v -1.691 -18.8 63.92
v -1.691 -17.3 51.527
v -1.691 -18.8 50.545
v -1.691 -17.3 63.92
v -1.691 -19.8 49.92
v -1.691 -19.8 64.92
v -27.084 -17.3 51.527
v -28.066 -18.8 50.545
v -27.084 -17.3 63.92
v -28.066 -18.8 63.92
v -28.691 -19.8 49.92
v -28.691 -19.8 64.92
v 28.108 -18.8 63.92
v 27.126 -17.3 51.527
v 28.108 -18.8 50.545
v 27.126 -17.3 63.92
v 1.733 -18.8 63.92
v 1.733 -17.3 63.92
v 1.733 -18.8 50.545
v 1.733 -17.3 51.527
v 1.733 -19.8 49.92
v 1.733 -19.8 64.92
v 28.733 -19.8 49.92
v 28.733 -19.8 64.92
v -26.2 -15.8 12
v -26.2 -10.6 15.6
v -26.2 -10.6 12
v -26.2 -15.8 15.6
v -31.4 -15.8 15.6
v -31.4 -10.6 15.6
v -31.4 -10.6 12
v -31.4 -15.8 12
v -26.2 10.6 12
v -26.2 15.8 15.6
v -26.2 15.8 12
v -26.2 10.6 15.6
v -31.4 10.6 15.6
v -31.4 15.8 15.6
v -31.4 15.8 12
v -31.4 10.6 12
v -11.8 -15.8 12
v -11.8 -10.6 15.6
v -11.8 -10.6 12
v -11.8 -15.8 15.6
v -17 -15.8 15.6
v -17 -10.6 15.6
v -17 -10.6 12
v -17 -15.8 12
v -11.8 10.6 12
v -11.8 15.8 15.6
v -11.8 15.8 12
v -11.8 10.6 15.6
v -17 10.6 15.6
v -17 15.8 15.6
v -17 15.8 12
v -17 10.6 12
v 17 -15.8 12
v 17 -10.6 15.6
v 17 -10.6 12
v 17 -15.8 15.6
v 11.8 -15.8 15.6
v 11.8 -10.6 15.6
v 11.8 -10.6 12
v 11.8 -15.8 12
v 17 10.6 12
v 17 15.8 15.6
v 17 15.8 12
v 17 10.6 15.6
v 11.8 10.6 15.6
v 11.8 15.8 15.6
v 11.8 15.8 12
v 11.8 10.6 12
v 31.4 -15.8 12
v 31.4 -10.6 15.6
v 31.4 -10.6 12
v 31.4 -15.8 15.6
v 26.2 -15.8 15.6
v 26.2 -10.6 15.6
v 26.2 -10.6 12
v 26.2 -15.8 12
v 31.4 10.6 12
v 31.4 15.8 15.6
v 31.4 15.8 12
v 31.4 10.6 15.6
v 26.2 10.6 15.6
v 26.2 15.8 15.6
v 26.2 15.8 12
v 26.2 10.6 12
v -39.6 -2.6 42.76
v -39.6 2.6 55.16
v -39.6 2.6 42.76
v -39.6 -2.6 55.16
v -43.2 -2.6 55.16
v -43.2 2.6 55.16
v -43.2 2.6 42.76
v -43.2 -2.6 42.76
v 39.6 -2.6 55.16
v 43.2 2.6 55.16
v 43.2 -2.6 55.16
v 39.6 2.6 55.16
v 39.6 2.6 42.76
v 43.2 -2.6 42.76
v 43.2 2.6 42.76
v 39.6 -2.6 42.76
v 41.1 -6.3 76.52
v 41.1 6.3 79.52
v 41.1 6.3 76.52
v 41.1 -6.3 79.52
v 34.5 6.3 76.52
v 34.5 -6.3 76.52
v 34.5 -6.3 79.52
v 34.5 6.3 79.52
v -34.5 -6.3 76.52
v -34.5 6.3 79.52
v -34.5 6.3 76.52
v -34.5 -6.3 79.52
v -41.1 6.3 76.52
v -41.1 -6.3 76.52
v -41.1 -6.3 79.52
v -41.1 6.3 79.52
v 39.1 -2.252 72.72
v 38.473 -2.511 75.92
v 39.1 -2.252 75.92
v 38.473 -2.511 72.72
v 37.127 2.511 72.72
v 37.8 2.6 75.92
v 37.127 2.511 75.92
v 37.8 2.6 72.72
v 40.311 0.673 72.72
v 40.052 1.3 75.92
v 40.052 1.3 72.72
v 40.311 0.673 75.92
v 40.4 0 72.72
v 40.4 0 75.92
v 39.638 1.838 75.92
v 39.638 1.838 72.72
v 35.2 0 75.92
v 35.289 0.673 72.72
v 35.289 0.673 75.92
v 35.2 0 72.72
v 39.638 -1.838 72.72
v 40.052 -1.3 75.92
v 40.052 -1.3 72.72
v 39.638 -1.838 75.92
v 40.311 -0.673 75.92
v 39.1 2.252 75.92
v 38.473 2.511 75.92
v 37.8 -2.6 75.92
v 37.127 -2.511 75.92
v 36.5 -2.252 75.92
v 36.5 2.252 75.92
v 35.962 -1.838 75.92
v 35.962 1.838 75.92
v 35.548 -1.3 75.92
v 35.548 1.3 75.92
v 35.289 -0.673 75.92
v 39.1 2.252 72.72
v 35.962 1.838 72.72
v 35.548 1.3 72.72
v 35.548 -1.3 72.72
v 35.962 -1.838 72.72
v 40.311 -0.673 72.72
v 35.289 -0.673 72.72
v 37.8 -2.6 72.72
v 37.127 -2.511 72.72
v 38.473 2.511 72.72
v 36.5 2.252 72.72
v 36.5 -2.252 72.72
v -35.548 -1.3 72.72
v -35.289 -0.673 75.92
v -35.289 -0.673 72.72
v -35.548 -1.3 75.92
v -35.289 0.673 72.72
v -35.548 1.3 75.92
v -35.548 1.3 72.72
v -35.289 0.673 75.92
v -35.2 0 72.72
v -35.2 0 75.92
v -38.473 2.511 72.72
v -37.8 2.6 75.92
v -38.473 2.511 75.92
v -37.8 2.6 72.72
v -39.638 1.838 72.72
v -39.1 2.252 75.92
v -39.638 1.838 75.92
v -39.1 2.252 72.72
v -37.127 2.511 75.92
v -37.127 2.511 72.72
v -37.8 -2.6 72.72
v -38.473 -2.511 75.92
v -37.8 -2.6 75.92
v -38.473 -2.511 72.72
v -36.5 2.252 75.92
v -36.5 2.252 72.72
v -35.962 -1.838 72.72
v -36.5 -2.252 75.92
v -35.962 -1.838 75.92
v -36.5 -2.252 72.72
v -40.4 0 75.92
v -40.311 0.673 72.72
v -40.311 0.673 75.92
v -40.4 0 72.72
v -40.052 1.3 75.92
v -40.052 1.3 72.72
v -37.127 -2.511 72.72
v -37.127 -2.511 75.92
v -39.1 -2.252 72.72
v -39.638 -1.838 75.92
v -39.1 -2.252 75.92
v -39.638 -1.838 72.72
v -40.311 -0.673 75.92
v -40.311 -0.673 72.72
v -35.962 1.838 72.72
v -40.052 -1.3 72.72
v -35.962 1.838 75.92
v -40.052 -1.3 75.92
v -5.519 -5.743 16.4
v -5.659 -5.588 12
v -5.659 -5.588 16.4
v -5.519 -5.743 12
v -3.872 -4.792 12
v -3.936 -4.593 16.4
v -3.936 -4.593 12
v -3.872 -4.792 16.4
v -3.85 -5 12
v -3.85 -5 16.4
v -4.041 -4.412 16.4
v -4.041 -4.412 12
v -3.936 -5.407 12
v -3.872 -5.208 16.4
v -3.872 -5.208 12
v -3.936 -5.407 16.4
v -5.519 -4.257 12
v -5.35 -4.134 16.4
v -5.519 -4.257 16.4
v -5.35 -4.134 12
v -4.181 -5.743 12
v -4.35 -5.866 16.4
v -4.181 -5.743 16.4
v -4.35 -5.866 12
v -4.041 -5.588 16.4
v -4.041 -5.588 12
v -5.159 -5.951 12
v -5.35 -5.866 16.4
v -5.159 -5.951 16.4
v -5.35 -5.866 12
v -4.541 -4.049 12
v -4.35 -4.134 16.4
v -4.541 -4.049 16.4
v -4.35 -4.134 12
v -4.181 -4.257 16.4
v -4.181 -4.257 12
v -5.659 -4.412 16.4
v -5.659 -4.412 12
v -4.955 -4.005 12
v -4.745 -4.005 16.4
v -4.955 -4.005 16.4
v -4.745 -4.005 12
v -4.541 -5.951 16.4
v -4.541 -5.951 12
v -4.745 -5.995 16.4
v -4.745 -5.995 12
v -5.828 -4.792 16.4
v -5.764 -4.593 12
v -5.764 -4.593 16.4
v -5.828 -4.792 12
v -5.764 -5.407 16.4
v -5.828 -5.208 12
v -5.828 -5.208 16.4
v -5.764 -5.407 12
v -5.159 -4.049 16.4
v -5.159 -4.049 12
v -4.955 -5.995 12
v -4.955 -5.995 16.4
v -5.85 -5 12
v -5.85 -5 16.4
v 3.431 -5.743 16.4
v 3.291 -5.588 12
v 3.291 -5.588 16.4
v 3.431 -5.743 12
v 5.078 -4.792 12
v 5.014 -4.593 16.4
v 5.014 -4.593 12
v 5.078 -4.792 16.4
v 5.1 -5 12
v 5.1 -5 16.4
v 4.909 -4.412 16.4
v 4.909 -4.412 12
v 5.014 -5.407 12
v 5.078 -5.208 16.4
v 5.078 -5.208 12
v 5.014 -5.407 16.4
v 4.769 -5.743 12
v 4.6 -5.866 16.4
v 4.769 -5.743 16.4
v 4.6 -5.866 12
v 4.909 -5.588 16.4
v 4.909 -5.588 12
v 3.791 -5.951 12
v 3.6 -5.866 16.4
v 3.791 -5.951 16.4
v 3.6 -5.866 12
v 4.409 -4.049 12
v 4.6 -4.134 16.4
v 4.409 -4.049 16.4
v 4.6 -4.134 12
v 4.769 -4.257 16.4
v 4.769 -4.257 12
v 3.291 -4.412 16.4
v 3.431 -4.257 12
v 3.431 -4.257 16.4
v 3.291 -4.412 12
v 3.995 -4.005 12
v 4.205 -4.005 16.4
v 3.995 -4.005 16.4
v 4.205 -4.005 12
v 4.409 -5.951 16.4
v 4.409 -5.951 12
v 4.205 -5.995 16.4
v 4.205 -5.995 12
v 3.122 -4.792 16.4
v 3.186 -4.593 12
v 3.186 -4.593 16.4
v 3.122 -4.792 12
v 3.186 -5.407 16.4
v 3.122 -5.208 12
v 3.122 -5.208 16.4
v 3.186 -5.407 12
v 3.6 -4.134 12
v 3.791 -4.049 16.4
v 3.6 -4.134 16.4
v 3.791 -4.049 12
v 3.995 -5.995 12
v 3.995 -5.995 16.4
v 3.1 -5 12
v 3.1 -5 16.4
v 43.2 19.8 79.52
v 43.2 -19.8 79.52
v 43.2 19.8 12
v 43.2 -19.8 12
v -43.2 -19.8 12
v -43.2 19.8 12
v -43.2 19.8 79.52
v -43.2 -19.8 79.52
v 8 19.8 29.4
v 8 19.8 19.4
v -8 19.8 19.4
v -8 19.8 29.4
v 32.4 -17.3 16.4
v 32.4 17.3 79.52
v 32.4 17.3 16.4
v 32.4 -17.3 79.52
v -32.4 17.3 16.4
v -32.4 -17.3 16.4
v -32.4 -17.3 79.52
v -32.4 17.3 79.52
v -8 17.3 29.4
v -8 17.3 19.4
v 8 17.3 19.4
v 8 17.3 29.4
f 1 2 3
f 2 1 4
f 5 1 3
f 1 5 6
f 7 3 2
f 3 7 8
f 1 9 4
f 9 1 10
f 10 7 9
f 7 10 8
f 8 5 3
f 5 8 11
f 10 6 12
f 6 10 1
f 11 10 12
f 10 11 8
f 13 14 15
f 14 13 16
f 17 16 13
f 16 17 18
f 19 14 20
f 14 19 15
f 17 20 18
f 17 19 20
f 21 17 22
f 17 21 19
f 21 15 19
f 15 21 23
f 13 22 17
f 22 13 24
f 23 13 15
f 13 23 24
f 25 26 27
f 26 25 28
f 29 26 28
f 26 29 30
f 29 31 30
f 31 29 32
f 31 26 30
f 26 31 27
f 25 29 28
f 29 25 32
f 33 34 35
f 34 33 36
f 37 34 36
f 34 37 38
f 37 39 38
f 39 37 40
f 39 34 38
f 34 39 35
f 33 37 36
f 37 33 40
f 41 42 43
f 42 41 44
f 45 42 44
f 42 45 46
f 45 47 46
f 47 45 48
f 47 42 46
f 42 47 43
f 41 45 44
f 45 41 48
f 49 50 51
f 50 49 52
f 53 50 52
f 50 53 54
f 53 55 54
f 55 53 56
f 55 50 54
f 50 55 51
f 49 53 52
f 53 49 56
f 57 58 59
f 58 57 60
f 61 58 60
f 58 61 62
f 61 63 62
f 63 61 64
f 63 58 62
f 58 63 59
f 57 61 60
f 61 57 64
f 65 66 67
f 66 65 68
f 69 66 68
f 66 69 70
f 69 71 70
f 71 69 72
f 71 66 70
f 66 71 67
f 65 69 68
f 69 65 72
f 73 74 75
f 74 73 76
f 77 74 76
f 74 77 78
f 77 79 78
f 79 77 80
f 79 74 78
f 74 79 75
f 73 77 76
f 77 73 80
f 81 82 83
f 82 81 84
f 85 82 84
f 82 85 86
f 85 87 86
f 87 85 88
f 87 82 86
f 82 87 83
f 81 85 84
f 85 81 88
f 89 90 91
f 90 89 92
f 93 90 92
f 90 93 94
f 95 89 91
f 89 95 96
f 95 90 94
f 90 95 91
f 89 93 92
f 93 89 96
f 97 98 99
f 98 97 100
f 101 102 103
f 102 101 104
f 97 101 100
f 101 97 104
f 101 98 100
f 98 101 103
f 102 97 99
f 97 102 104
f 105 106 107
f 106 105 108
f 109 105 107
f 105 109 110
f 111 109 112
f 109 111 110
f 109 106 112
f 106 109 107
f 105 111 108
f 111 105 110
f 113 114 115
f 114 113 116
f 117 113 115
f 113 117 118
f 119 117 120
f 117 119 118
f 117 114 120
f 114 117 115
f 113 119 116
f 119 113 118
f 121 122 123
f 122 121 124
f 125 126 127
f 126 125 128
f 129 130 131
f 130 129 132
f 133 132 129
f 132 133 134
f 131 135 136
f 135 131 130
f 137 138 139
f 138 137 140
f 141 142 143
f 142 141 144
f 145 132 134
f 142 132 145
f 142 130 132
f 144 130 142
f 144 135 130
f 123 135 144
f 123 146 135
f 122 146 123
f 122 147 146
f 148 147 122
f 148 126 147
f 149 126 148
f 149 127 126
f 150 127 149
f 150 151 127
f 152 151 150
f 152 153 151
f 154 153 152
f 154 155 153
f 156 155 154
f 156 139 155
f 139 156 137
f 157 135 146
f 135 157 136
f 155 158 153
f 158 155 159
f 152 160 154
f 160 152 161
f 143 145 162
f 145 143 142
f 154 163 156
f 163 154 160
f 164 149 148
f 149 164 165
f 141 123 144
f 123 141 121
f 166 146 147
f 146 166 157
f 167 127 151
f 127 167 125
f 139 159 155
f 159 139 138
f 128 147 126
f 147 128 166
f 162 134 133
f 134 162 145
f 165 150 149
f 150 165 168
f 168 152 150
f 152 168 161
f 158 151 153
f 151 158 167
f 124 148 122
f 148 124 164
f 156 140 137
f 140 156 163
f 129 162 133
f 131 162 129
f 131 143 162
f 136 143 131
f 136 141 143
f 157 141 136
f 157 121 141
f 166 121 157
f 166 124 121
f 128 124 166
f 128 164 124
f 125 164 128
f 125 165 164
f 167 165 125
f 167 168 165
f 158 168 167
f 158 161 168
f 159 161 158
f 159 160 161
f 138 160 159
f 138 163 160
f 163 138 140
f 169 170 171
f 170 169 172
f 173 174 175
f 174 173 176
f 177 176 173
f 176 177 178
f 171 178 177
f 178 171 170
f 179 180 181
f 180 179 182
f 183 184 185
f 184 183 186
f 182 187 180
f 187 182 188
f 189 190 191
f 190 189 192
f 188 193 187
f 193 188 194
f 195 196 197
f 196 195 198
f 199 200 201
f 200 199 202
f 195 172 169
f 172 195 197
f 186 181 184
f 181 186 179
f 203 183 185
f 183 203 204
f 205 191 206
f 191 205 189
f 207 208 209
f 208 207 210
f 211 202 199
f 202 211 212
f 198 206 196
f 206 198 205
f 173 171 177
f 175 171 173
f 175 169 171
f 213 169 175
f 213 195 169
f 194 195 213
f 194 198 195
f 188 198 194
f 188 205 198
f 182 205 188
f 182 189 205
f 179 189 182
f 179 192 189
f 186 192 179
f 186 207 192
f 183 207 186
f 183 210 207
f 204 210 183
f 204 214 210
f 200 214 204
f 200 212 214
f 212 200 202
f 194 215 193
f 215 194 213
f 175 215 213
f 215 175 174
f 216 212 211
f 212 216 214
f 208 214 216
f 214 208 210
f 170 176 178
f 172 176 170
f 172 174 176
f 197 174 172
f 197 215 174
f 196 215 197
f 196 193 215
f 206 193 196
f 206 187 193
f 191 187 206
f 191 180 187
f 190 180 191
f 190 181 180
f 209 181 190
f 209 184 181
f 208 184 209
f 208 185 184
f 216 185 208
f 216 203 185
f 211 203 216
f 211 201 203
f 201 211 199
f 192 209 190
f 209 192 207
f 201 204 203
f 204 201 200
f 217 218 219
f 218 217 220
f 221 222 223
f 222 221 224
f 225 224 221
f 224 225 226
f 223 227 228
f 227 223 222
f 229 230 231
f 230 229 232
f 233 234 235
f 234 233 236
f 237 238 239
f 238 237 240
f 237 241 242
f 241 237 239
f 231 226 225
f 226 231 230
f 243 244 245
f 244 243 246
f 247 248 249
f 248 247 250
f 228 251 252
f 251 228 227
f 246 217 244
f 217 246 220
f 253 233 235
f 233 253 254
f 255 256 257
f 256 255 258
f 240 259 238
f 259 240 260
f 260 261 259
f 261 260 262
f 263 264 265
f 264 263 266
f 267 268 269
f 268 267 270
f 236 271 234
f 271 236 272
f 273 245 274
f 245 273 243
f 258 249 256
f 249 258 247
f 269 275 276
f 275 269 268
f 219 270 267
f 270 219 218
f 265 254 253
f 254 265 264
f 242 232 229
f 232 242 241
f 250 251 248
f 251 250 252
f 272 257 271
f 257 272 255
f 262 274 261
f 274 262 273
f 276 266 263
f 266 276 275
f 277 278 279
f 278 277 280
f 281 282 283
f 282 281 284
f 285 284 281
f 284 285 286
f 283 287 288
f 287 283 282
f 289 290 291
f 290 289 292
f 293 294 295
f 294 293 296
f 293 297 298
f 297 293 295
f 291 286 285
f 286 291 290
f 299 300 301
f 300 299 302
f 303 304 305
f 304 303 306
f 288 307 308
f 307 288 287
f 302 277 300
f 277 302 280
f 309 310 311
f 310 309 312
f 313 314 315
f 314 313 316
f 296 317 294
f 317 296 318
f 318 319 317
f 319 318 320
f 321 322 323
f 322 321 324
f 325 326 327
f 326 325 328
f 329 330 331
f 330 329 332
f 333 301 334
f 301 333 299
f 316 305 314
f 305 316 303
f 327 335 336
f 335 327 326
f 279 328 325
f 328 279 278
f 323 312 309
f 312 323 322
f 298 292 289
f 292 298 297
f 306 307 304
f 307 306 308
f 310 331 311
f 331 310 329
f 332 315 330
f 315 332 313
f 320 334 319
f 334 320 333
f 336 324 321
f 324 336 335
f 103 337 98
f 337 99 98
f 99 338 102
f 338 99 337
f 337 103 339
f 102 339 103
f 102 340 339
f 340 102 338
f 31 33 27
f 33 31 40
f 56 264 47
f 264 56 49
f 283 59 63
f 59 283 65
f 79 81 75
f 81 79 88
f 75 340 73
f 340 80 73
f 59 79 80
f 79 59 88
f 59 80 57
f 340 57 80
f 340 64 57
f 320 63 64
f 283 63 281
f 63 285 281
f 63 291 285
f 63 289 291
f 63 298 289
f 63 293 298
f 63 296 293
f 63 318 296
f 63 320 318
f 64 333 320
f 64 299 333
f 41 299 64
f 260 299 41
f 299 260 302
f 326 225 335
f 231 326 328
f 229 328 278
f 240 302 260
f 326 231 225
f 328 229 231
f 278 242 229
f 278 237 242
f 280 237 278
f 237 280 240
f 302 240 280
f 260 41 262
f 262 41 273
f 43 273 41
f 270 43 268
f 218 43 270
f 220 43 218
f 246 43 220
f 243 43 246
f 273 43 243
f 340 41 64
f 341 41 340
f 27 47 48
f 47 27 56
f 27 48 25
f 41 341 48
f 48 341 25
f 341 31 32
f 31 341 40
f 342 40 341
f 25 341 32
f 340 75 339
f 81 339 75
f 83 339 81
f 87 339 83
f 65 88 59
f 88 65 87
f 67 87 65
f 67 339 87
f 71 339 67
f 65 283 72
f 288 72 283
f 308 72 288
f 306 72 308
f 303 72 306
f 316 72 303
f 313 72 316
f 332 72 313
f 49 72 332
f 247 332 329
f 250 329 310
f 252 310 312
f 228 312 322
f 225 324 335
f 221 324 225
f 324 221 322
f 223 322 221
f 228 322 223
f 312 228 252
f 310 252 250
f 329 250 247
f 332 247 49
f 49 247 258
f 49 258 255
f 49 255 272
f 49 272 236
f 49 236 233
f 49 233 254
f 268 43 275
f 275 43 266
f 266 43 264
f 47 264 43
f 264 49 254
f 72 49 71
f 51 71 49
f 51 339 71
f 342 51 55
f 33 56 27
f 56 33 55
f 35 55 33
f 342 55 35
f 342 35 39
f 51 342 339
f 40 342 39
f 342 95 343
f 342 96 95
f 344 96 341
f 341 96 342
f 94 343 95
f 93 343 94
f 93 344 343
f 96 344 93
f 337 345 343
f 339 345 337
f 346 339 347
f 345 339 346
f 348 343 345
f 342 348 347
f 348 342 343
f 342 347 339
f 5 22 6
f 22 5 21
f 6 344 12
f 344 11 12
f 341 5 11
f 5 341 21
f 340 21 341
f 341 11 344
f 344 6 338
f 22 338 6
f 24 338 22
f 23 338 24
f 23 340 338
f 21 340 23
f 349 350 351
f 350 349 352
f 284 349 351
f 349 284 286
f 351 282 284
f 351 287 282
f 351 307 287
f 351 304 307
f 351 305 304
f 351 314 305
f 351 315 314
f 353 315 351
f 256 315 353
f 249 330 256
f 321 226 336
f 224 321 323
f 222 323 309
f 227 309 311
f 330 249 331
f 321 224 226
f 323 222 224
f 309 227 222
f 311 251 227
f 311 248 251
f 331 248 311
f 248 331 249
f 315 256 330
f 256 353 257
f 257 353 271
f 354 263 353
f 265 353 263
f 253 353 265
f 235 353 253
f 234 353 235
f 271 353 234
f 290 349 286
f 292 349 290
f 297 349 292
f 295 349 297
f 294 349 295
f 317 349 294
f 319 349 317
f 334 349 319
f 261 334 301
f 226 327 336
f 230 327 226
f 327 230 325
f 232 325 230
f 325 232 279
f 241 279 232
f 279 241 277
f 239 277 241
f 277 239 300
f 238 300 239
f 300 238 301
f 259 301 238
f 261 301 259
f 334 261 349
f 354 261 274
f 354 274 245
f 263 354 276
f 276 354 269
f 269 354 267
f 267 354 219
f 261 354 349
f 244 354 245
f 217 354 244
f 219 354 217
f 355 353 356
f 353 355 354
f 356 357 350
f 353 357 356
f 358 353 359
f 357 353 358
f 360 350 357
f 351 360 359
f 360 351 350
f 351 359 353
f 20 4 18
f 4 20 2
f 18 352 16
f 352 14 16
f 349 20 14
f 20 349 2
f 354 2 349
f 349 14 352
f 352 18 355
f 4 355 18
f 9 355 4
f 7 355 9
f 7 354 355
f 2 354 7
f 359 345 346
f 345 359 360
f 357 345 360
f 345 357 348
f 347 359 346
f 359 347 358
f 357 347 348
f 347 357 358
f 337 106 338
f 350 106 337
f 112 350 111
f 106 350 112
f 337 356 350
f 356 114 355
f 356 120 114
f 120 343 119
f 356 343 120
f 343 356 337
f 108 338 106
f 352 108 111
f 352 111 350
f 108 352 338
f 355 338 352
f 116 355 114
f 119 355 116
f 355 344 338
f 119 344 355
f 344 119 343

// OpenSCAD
// =========================================================================
// CLAW-D MASCOT: LARGE EDITION (SLED READY, REAR SCREW MOUNTS)
// =========================================================================

/* [Fixed Hardware Specifications] */
pcb_w     = 27.3;             // Physical width of standard 0.96" OLED PCB
glass_t   = 2.4;              // Depth from front of OLED glass to back of PCB
clearance = 0.4;              // Global 3D printing tolerance fit
$fn       = 24;               // Curve smoothness (resolution for cylinders/arcs)

/* [Adjustable Features] */
print_mode           = "base"; // [ "assembled", "base", "cap", "legs", "arms" ]
eye_w                = 25;     // Width of the front eye cutouts (original: 23)
eye_h                = 12;     // Height of the front eye cutouts (original: 14)
eye_mm_height_adjust = 5;      // Vertical shift for the eye cutouts
eye_chamfer          = 2.0;    // Outward slant on outer edges for better viewing angle
top_softness         = 1.0;    // Top edge chamfer amount (leaves the rest flat for supports)
leg_inset            = 3.0;    // Inward adjustment distance for front and back legs

usb_hole_height_adjuster = 5.0; // Vertical shift for the rear USB-C cable pass-through

// Variables to protect the internal cavity while adding alignment pin holes
bottom_thickness_added = 2.4;  // Extra thickness added to the base for structural integrity
pin_height             = 3.0;  // Height of the alignment pins (arms/legs)
hole_depth             = 3.6;  // Depth of the receiving holes (allows 0.6mm clearance for glue/fit)

/* [Base Pocket Adjustments] */
pocket_w_extra = clearance + 0.2; // Extra width for base pocket (default was global clearance: 0.4)
pocket_d_extra = clearance + 0.2; // Extra depth for base pocket (default was global clearance: 0.4)
pocket_h_extra = clearance + 0.0; // Extra height/depth for base pocket (default was hardcoded 0.1)

/* [Magnetic Clasp & Split] */
magnet_dia      = 5.2; // Diameter of hidden pocket (+0.2mm tolerance for 5mm magnet)
magnet_depth    = 3.2; // Depth of hidden pocket (+0.2mm tolerance for 3mm magnet)
cover_thickness = 0.6; // Layers of plastic hiding the magnet (0.6 = 3x 0.2mm print layers)

/* [Sled Button Alignment] */
button_hole_d              = 2.0;  // Hole size for boot/reset access (sized for a paperclip)
esp_w                      = 18.2; // Matches internal sled's ESP width for exact offset mapping
left_button_hole_x_offset  = 4.25; // X-axis offset for the left (BOOT) button
right_button_hole_x_offset = 5.0;  // X-axis offset for the right (RESET) button
button_hole_y              = -5;   // Y-axis depth alignment (Maps to sled's updated math: 17.5 - 22.25)

// =========================================================================
// MAIN EXECUTION
// =========================================================================

if (print_mode == "cap") {
    // Flips the cap 180 degrees and drops the flat seam exactly to the Z=0 build plate
    // Math: Z-height shift = (2 * unit + head_h - 4)
    translate([0, 0, 2*7.2 + 69.12 - 4]) 
        rotate([180, 0, 0]) 
            clawd_chassis();
} else {
    clawd_chassis();
}

// =========================================================================
// CHASSIS MODULE
// =========================================================================

module clawd_chassis() {
    
    // 1. HARDCODED LARGE PARAMETERS
    unit   = 7.2;
    head_w = 86.4;    // 12 * 7.2 (Total head width)
    head_h = 69.12;   // 86.4 / 1.25 (Total head height proportional to width)
    head_d = 39.6;    // 5.5 * 7.2 (Total head depth)
    
    // Split line and Boss parameters for two-part printing
    split_z = 2*unit + head_h - 4; // Z-height where the cap splits from the base
    boss_w  = 6.0;                 // Width of the alignment bosses
    boss_d  = 12.0;                // Depth of the alignment bosses
    boss_h  = 3.0;                 // Height of the alignment bosses
    boss_x  = 37.8;                // X-axis position (centered precisely in the solid side-walls)

    // Render the main body if we are printing the base, cap, or full assembly
    if (print_mode == "base" || print_mode == "cap" || print_mode == "assembled") {
        difference() {
            // 2. THE ACCURATE PROPORTIONAL OUTER SHELL
            union() {
                // Main Head (Bottom extended downward by bottom_thickness_added)
                translate([-head_w/2, -head_d/2, 2*unit - bottom_thickness_added]) 
                    cube([head_w, head_d, head_h + bottom_thickness_added]);
                    
                // Structural Alignment Bosses (Added to Cap for reassembly)
                if (print_mode == "cap" || print_mode == "assembled") {
                    translate([boss_x - boss_w/2, -boss_d/2, split_z - boss_h])
                        cube([boss_w, boss_d, boss_h]);
                    translate([-boss_x - boss_w/2, -boss_d/2, split_z - boss_h])
                        cube([boss_w, boss_d, boss_h]);
                }
                
                // Attach non-removable limbs for 'assembled' visualization
                if (print_mode == "assembled") {
                    // Left Side Stub/Arm
                    translate([-head_w/2 - 2*unit, -unit/2, head_h/2 + unit]) 
                        cube([2*unit, unit, 2*unit]);
                    
                    // Right Side Stub/Arm
                    translate([head_w/2, -unit/2, head_h/2 + unit]) 
                        cube([2*unit, unit, 2*unit]);
                        
                    // ---- STABLE EIGHT LEG SQUID STRUCTURE ----
                    for(x = [-4.5*unit, -2.5*unit, 1.5*unit, 3.5*unit]) {
                        for(y = [-head_d/2 + leg_inset, head_d/2 - unit - leg_inset]) {
                            // Legs end where the newly lowered chassis begins
                            translate([x, y, 0]) 
                                cube([unit, unit, 2*unit - bottom_thickness_added]);
                        }
                    }
                }
            }
            
            // 3. INTERNAL CAVITY (Untouched coordinates)
            // Hollows out the center for the PCB sled and wiring
            translate([-4.5*unit, -head_d/2 + 2.5, 2*unit + 2])
                cube([9*unit, head_d - 5, head_h - 3.8]);
                
            // 4. FRONT FACE EYE WINDOWS (Two-Stage Cut for Supports + Soft Edge)
            eye_shift_x = 0.4; // Fine-tuning offset to perfectly center the eyes
            
            // Left Eye Cutout
            translate([-2.5*unit - eye_w/2.75 + eye_shift_x, -head_d/2 - 0.1, head_h - 2.25*unit - eye_h/2 + eye_mm_height_adjust])
                chamfered_eye(is_left = true);
                
            // Right Eye Cutout
            translate([2.5*unit - eye_w/1.5 + eye_shift_x, -head_d/2 - 0.1, head_h - 2.25*unit - eye_h/2 + eye_mm_height_adjust])
                chamfered_eye(is_left = false);
                
            // 5. PRECISION SCREEN RETENTION SLOT (Untouched coordinates)
            // Secures the OLED glass directly against the front wall
            translate([-4.5*unit, -head_d/2 + 2.5, 2*unit + 2])
                cube([9*unit, glass_t + clearance, head_h - 3.8]);

            // 6. UPPER WIRING & PIN RELIEF CHANNEL (Untouched coordinates)
            // Provides headroom for dupont wires or headers at the top of the sled
            translate([-4.5*unit, -head_d/2 + 2.5, head_h + unit - 2])
                cube([9*unit, head_d - 5, 3]);
                
            // 7. DIRECT REAR USB-C CABLE PASS-THROUGH (Untouched coordinates)
            translate([-8, head_d/2 - 4, 2*unit + usb_hole_height_adjuster])
                cube([16, 10, 10]);

            // 8. LEG ALIGNMENT HOLES
            if (print_mode == "base") {
                for(x = [-4.5*unit, -2.5*unit, 1.5*unit, 3.5*unit]) {
                    for(y = [-head_d/2 + leg_inset, head_d/2 - unit - leg_inset]) {
                        // Cut upwards from the newly lowered chassis bottom to receive leg pins
                        translate([x + 1.2 - clearance/2, y + 1.2 - clearance/2, 2*unit - bottom_thickness_added - 0.1])
                            cube([unit - 2.4 + clearance, unit - 2.4 + clearance, hole_depth + 0.1]);
                    }
                }
            }
            
            // 8.5 ARM ALIGNMENT HOLES
            if (print_mode == "base") {
                // Left Arm Hole
                translate([-head_w/2 - 0.1, -unit/2 + 1.2 - clearance/2, head_h/2 + unit + 1.2 - clearance/2])
                    cube([hole_depth + 0.1, unit - 2.4 + clearance, 2*unit - 2.4 + clearance]);
                    
                // Right Arm Hole
                translate([head_w/2 - hole_depth, -unit/2 + 1.2 - clearance/2, head_h/2 + unit + 1.2 - clearance/2])
                    cube([hole_depth + 0.1, unit - 2.4 + clearance, 2*unit - 2.4 + clearance]);
            }
                
            // 9. FLAT SEAM SPLIT (Creates the physical separation between Cap and Base)
            if (print_mode == "base") {
                // Flush cut everything above the split line
                translate([-head_w/2 - 5, -head_d/2 - 5, split_z]) 
                    cube([head_w + 10, head_d + 10, 20]);
            }
            
            if (print_mode == "cap") {
                // Flush cut everything below the split line, EXCEPT the bosses
                difference() {
                    translate([-100, -100, -20]) 
                        cube([200, 200, split_z + 20]);
                        
                    // Protect bosses from being severed by the flush cut
                    translate([boss_x - boss_w/2 - 0.1, -boss_d/2 - 0.1, split_z - boss_h - 0.1])
                        cube([boss_w + 0.2, boss_d + 0.2, boss_h + 0.2]);
                    translate([-boss_x - boss_w/2 - 0.1, -boss_d/2 - 0.1, split_z - boss_h - 0.1])
                        cube([boss_w + 0.2, boss_d + 0.2, boss_h + 0.2]);
                }
            }

            // 9.5 ALIGNMENT POCKETS & HIDDEN MAGNET VOIDS
            if (print_mode == "base") {
                // Clearance pockets for the Cap bosses to slot into
                translate([boss_x - boss_w/2 - pocket_w_extra/2, -boss_d/2 - pocket_d_extra/2, split_z - boss_h])
                    cube([boss_w + pocket_w_extra, boss_d + pocket_d_extra, boss_h + pocket_h_extra]);
                translate([-boss_x - boss_w/2 - pocket_w_extra/2, -boss_d/2 - pocket_d_extra/2, split_z - boss_h])
                    cube([boss_w + pocket_w_extra, boss_d + pocket_d_extra, boss_h + pocket_h_extra]);
                    
                // Hidden magnet voids below the clearance pockets
                // (Intended for a mid-print pause to drop magnets in before covering the top)
                translate([boss_x, 0, split_z - boss_h - cover_thickness - magnet_depth])
                    cylinder(h=magnet_depth, d=magnet_dia);
                translate([-boss_x, 0, split_z - boss_h - cover_thickness - magnet_depth])
                    cylinder(h=magnet_depth, d=magnet_dia);
            }
            
            // 10. SLED BUTTON HOLES (BOOT / RESET access from underneath)
            if (print_mode == "base" || print_mode == "assembled") {
                // Left Hole (Boot)
                translate([-esp_w/2 + left_button_hole_x_offset, button_hole_y, 0])
                    cylinder(d=button_hole_d, h=20, $fn=30);
                
                // Right Hole (Reset)
                translate([esp_w/2 - right_button_hole_x_offset, button_hole_y, 0])
                    cylinder(d=button_hole_d, h=20, $fn=30);
            }
            
            if (print_mode == "cap") {
                // Hidden magnet voids inside the protruding bosses
                // (When cap is printed upside down, printer pauses here before bridging the floor)
                translate([boss_x, 0, split_z - boss_h + cover_thickness])
                    cylinder(h=magnet_depth, d=magnet_dia);
                translate([-boss_x, 0, split_z - boss_h + cover_thickness])
                    cylinder(h=magnet_depth, d=magnet_dia);
            }
        }
    }

    // 10. INDEPENDENT LEGS MODE
    if (print_mode == "legs") {
        for(x = [-4.5*unit, -2.5*unit, 1.5*unit, 3.5*unit]) {
            for(y = [-head_d/2 + leg_inset, head_d/2 - unit - leg_inset]) {
                union() {
                    // Leg base (exactly meets the lowered bottom of the chassis)
                    translate([x, y, 0]) 
                        cube([unit, unit, 2*unit - bottom_thickness_added]);
                    // Alignment pin (inserts into chassis hole)
                    translate([x + 1.2, y + 1.2, 2*unit - bottom_thickness_added]) 
                        cube([unit - 2.4, unit - 2.4, pin_height]);
                }
            }
        }
    }
    
    // 11. INDEPENDENT ARMS MODE (Laid flat for vertical pin printing)
    if (print_mode == "arms") {
        // Generates two identical arms side-by-side on the Z=0 build plane
        for(x = [-1.5*unit, 1.5*unit]) {
            translate([x - unit, -unit/2, 0]) {
                union() {
                    // Arm body (laying on its flat side for strength)
                    cube([2*unit, unit, 2*unit]);
                    // Alignment pin (pointing straight up)
                    translate([1.2, 1.2, 2*unit]) 
                        cube([2*unit - 2.4, unit - 2.4, pin_height]);
                }
            }
        }
    }
}

// =========================================================================
// HELPER MODULES
// =========================================================================

// Module to create a slanted eye-hole cut with a flat roof for FDM supports, ending in a soft outer chamfer
module chamfered_eye(is_left) {
    depth = 3.2; // Distance needed to penetrate the 2.5mm front wall completely
    
    // Calculates the intermediate side/bottom flare to keep those slopes perfectly straight
    flare_mid = eye_chamfer * ((depth - top_softness) / depth);
    
    union() {
        // STAGE 1: MAIN BODY (Flat Top for Supports) 
        // Extends from the inside out to exactly 'top_softness' distance from the outer surface
        hull() {
            // INNER HOLE: Matches OLED screen exactly (touching the glass)
            translate([0, depth - 0.1, 0])
                cube([eye_w, 0.1, eye_h]);
                
            // MID HOLE: Transition point where the flat top ends and chamfer begins
            if (is_left) {
                translate([-flare_mid, top_softness, -flare_mid])
                    cube([eye_w + flare_mid, 0.1, eye_h + flare_mid]);
            } else {
                translate([0, top_softness, -flare_mid])
                    cube([eye_w + flare_mid, 0.1, eye_h + flare_mid]);
            }
        }
        
        // STAGE 2: OUTER LIP (Softened/Chamfered Top) 
        // Covers the final distance to the outside face, ramping the roof up to break the sharp edge
        hull() {
            // MID HOLE: Transition point (same as above)
            if (is_left) {
                translate([-flare_mid, top_softness, -flare_mid])
                    cube([eye_w + flare_mid, 0.1, eye_h + flare_mid]);
            } else {
                translate([0, top_softness, -flare_mid])
                    cube([eye_w + flare_mid, 0.1, eye_h + flare_mid]);
            }
            
            // OUTER HOLE: Flared sides/bottom AND flared top (completes the chamfer)
            if (is_left) {
                translate([-eye_chamfer, 0, -eye_chamfer])
                    cube([eye_w + eye_chamfer, 0.1, eye_h + eye_chamfer + top_softness]);
            } else {
                translate([0, 0, -eye_chamfer])
                    cube([eye_w + eye_chamfer, 0.1, eye_h + eye_chamfer + top_softness]);
            }
        }
    }
}
